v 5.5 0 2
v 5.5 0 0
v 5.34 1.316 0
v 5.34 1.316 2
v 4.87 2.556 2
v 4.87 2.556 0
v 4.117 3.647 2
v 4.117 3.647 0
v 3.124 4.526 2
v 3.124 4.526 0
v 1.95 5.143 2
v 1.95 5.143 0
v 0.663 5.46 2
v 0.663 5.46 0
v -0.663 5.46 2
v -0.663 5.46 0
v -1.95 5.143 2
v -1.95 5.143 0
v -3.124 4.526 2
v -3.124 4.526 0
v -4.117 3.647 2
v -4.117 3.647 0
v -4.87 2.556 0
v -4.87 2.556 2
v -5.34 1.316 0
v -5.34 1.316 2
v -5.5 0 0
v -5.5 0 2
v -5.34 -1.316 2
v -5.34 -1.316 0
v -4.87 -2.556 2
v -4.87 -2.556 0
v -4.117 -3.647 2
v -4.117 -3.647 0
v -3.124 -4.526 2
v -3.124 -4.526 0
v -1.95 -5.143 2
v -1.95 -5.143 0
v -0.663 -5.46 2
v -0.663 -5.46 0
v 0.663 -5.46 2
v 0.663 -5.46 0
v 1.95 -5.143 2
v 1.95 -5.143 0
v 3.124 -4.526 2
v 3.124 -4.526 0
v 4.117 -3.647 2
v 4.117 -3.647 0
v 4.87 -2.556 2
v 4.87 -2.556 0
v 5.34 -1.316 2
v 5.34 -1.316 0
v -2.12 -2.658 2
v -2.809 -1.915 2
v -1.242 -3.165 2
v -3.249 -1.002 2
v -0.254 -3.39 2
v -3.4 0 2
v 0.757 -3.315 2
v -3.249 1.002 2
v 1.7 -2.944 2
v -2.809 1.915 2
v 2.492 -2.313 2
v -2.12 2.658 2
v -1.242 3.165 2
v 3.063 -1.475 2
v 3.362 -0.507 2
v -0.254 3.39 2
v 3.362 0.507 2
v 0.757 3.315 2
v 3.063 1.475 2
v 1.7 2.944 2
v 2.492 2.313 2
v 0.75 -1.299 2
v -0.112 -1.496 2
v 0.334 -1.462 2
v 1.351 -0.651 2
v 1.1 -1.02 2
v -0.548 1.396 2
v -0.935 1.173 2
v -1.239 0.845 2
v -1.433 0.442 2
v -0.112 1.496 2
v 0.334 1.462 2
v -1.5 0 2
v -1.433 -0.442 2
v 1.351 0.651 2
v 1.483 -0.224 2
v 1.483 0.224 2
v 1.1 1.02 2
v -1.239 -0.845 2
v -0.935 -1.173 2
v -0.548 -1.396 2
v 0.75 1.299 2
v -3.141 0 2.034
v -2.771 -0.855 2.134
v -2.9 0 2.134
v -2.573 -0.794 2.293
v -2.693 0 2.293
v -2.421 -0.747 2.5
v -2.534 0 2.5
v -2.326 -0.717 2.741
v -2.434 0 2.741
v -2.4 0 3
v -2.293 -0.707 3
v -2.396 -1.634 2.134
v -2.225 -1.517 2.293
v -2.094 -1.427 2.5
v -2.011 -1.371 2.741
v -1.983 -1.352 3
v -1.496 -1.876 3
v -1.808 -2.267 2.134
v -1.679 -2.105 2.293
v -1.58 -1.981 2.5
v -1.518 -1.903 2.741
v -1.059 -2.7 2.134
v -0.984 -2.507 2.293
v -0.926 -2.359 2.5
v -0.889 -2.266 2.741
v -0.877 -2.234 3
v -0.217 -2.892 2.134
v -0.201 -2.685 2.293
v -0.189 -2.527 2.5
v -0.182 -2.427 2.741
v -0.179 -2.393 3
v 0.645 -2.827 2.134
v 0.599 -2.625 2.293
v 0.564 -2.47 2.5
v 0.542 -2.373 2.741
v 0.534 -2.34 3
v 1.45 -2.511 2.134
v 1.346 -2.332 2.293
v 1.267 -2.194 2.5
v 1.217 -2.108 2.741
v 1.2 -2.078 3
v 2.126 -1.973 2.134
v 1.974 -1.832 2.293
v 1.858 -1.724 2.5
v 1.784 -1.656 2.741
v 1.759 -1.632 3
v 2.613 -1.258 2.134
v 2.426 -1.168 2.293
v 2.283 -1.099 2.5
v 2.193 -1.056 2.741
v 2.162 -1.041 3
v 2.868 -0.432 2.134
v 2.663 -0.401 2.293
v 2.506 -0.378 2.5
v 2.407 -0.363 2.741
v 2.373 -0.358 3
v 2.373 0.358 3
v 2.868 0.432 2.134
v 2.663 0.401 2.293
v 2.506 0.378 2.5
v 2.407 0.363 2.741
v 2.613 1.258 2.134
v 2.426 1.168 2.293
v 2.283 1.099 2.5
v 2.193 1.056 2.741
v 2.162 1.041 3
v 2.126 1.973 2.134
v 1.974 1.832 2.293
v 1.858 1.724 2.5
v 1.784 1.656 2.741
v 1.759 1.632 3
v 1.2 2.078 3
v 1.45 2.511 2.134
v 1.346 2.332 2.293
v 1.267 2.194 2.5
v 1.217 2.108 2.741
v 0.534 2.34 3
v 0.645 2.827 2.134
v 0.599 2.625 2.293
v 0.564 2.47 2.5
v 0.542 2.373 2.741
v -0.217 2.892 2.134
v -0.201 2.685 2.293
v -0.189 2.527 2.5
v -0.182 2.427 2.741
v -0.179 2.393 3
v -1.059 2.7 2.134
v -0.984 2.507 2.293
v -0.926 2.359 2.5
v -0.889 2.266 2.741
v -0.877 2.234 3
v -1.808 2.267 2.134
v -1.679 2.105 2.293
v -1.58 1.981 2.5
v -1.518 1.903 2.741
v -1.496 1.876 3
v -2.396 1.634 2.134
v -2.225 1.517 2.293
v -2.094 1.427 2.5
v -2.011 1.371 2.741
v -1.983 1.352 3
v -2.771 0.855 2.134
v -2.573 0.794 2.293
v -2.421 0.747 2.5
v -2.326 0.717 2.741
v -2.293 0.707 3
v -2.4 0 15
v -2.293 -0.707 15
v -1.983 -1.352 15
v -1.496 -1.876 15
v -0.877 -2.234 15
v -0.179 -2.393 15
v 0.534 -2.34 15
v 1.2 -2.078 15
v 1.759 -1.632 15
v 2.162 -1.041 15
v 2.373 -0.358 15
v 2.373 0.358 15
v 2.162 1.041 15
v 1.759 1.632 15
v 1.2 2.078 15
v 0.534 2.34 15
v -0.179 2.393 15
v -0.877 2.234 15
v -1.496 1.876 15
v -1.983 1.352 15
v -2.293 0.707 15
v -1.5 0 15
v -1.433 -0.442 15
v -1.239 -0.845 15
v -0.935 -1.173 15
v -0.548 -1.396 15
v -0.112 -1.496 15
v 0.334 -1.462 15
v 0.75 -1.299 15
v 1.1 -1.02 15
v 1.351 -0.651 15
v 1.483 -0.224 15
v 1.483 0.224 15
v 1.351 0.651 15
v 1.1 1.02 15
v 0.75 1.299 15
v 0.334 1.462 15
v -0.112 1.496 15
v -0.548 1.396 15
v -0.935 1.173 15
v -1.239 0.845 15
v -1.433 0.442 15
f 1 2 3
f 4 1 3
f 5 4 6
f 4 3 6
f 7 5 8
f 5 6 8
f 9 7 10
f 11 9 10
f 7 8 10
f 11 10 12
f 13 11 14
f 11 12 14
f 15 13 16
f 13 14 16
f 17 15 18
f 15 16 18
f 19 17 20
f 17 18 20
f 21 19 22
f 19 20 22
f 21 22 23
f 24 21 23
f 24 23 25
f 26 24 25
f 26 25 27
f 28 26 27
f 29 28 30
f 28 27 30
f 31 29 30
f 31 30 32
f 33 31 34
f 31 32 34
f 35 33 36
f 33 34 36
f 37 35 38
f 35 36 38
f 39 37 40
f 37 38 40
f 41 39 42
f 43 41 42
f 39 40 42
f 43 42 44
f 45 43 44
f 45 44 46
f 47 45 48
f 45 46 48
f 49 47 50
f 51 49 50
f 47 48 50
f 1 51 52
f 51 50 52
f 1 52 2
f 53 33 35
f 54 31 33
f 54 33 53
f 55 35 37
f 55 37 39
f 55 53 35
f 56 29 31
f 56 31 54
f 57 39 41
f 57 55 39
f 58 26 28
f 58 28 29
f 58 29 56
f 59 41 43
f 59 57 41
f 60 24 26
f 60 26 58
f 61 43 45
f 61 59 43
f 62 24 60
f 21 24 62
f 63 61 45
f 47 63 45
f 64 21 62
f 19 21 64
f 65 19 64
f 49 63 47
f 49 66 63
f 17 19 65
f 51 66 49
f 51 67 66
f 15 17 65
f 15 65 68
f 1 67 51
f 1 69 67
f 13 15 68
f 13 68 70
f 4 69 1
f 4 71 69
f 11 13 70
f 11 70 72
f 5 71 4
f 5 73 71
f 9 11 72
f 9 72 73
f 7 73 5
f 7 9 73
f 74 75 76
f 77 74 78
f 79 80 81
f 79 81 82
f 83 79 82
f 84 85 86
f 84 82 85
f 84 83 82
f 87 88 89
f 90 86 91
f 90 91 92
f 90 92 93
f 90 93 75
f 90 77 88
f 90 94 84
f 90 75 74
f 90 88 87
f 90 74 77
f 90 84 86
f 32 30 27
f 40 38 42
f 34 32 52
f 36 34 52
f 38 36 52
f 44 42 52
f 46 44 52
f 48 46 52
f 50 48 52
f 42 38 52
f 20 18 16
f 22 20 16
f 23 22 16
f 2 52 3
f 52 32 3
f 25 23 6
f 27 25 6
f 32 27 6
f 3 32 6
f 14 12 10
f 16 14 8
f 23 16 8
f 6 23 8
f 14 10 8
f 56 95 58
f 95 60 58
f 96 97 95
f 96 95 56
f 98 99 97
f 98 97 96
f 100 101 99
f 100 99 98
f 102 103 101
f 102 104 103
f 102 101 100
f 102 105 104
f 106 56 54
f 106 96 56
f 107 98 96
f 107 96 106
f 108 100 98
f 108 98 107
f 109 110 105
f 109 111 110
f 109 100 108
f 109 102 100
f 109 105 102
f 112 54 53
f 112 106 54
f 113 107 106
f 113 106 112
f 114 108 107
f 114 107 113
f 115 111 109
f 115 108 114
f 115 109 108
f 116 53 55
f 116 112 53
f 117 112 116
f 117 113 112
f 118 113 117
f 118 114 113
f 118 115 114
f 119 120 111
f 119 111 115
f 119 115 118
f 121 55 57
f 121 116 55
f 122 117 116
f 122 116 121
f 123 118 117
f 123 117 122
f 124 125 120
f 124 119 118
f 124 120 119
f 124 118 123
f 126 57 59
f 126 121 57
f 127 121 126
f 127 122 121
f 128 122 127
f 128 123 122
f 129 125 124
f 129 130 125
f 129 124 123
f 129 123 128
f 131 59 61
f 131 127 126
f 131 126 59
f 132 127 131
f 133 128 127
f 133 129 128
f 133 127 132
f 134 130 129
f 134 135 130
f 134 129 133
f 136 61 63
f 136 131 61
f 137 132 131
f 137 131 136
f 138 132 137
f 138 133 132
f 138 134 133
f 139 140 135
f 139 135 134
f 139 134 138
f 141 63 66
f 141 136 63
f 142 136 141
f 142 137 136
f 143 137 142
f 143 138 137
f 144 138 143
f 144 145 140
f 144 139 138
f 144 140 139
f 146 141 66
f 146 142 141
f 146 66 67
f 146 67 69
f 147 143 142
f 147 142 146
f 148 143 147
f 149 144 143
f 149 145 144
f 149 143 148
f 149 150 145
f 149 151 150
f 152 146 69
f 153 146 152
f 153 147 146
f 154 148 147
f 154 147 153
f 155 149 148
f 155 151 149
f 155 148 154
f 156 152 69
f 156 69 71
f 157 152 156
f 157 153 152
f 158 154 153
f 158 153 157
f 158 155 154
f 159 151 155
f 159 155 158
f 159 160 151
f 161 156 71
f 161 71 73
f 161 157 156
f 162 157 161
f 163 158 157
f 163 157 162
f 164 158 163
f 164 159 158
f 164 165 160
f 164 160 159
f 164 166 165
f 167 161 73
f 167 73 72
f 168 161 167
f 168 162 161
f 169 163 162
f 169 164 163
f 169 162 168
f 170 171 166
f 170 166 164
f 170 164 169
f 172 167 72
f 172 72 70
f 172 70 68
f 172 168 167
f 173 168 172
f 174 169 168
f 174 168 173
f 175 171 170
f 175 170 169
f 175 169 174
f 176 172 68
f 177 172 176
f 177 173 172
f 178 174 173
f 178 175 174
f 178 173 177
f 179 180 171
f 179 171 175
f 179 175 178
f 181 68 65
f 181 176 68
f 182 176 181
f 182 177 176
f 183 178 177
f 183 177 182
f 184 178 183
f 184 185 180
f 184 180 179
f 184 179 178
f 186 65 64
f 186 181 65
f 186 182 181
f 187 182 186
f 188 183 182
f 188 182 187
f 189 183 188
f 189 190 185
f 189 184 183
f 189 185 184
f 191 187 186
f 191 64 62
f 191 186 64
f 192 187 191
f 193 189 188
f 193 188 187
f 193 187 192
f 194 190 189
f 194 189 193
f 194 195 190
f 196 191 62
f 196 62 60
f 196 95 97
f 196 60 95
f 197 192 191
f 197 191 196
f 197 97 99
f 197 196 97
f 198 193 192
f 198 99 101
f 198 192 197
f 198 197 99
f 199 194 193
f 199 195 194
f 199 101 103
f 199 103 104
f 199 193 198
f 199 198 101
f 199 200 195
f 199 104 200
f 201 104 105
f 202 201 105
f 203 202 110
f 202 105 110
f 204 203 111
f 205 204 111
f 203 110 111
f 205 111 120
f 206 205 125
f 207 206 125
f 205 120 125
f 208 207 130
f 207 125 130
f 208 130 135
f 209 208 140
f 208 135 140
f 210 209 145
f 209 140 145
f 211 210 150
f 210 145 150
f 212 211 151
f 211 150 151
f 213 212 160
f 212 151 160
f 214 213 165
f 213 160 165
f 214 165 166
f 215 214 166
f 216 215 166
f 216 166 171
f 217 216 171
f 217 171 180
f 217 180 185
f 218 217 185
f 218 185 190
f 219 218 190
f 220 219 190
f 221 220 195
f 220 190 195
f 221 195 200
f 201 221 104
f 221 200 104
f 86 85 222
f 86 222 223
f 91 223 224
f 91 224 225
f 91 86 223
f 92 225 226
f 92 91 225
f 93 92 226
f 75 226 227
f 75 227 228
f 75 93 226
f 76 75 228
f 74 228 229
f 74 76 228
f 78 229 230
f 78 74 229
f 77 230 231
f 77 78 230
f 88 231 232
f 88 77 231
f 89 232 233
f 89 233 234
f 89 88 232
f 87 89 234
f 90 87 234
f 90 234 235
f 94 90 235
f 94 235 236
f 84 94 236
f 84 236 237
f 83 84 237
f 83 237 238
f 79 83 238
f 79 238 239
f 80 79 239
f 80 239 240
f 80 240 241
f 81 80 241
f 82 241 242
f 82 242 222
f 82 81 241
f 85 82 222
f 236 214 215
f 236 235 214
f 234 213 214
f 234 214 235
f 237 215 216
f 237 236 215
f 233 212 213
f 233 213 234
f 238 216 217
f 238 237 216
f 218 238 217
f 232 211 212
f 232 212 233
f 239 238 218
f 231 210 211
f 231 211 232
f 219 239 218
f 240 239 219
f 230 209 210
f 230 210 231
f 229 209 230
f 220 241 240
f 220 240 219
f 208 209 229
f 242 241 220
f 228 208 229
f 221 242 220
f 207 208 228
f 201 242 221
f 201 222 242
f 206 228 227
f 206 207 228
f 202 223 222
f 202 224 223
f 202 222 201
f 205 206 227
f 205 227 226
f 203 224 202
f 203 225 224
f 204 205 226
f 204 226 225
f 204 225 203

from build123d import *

# Parameters (mm, degrees)
ESQUISSE1_R        = 5.5
BOSS_EXTRU_1_DEPTH = 2
ESQUISSE2_R        = 2.4
ESQUISSE2_R_2      = 1.5
BOSS_EXTRU_2_DEPTH = 13
CONG_1_R           = 1


with BuildPart() as part:
    # Esquisse1 → Boss.-Extru.1 (new body)
    with BuildSketch(Plane.XY):
        Circle(ESQUISSE1_R)
    extrude(amount=BOSS_EXTRU_1_DEPTH)

    # Esquisse2 → Boss.-Extru.2 (add)
    with BuildSketch(Plane.XY.offset(2)):
        with Locations(Location((0, 0, 0), (0, 0, 180))):
            Circle(ESQUISSE2_R)
        with Locations(Location((0, 0, 0), (0, 0, 180))):
            Circle(ESQUISSE2_R_2, mode=Mode.SUBTRACT)
    extrude(amount=BOSS_EXTRU_2_DEPTH)

    # Congé1
    cong_1_edges = [part.edges().sort_by_distance(p)[0] for p in [
        (2.4, 0, 2),
    ]]
    fillet(cong_1_edges, radius=CONG_1_R)


solid = part.part
